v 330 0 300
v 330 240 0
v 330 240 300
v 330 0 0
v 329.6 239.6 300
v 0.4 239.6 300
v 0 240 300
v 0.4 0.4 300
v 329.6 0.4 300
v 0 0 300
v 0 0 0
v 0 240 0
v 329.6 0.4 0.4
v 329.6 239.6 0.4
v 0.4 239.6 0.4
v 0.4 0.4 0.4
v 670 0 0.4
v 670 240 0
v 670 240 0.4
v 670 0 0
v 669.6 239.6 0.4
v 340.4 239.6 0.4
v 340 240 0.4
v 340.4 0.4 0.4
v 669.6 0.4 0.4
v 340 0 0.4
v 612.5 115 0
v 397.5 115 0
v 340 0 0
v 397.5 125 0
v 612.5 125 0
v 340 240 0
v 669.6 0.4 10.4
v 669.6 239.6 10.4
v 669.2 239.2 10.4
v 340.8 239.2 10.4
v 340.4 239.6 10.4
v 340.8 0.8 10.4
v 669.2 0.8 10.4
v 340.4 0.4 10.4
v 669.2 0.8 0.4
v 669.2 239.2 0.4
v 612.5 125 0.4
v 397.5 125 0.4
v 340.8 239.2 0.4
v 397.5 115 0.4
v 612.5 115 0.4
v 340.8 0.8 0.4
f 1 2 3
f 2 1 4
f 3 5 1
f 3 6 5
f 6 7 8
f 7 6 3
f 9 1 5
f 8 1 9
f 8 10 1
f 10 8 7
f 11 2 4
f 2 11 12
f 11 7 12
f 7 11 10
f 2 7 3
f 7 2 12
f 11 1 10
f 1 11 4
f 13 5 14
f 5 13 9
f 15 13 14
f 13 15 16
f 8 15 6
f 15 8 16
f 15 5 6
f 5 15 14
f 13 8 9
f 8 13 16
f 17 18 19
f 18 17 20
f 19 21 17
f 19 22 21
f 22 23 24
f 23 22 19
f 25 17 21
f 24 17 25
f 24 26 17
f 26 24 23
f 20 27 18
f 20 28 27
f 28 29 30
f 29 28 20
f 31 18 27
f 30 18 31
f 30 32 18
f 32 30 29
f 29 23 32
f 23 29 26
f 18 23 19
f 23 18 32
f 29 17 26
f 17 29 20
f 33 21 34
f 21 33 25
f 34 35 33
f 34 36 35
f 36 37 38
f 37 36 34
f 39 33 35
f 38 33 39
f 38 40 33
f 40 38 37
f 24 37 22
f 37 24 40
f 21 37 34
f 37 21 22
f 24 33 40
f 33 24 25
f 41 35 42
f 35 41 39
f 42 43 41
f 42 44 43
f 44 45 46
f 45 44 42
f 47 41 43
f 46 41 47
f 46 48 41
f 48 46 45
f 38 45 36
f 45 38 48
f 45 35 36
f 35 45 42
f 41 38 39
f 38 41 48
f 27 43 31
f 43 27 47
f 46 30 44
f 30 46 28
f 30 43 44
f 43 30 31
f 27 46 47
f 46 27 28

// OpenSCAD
thickness_xy = 0.4;
thickness_z = 0.4;
lid_thickness = 10;
slit_x = 215;
slit_y = 10;

printer_x = 330;
printer_y = 240;
printer_z = 300;


//Box.
difference() {
	cube([printer_x, printer_y, printer_z]);
	translate([thickness_xy, thickness_xy, thickness_z]) {
		cube([printer_x - thickness_xy * 2, printer_y - thickness_xy * 2, printer_z - thickness_z]);
	}
}

//Lid.
translate([printer_x + 10, 0, 0]) {
	difference() {
		union() {
			cube([printer_x, printer_y, thickness_z]);
			translate([thickness_xy, thickness_xy, thickness_z]) {
				cube([printer_x - thickness_xy * 2, printer_y - thickness_xy * 2, lid_thickness]);
			}
		}
		translate([thickness_xy * 2, thickness_xy * 2, thickness_z]) {
			cube([printer_x - thickness_xy * 4, printer_y - thickness_xy * 4, lid_thickness]);
		}
		translate([printer_x / 2 - slit_x / 2, printer_y / 2 - slit_y / 2, 0]) {
			cube([slit_x, slit_y, thickness_z]);
		}
	}
}
